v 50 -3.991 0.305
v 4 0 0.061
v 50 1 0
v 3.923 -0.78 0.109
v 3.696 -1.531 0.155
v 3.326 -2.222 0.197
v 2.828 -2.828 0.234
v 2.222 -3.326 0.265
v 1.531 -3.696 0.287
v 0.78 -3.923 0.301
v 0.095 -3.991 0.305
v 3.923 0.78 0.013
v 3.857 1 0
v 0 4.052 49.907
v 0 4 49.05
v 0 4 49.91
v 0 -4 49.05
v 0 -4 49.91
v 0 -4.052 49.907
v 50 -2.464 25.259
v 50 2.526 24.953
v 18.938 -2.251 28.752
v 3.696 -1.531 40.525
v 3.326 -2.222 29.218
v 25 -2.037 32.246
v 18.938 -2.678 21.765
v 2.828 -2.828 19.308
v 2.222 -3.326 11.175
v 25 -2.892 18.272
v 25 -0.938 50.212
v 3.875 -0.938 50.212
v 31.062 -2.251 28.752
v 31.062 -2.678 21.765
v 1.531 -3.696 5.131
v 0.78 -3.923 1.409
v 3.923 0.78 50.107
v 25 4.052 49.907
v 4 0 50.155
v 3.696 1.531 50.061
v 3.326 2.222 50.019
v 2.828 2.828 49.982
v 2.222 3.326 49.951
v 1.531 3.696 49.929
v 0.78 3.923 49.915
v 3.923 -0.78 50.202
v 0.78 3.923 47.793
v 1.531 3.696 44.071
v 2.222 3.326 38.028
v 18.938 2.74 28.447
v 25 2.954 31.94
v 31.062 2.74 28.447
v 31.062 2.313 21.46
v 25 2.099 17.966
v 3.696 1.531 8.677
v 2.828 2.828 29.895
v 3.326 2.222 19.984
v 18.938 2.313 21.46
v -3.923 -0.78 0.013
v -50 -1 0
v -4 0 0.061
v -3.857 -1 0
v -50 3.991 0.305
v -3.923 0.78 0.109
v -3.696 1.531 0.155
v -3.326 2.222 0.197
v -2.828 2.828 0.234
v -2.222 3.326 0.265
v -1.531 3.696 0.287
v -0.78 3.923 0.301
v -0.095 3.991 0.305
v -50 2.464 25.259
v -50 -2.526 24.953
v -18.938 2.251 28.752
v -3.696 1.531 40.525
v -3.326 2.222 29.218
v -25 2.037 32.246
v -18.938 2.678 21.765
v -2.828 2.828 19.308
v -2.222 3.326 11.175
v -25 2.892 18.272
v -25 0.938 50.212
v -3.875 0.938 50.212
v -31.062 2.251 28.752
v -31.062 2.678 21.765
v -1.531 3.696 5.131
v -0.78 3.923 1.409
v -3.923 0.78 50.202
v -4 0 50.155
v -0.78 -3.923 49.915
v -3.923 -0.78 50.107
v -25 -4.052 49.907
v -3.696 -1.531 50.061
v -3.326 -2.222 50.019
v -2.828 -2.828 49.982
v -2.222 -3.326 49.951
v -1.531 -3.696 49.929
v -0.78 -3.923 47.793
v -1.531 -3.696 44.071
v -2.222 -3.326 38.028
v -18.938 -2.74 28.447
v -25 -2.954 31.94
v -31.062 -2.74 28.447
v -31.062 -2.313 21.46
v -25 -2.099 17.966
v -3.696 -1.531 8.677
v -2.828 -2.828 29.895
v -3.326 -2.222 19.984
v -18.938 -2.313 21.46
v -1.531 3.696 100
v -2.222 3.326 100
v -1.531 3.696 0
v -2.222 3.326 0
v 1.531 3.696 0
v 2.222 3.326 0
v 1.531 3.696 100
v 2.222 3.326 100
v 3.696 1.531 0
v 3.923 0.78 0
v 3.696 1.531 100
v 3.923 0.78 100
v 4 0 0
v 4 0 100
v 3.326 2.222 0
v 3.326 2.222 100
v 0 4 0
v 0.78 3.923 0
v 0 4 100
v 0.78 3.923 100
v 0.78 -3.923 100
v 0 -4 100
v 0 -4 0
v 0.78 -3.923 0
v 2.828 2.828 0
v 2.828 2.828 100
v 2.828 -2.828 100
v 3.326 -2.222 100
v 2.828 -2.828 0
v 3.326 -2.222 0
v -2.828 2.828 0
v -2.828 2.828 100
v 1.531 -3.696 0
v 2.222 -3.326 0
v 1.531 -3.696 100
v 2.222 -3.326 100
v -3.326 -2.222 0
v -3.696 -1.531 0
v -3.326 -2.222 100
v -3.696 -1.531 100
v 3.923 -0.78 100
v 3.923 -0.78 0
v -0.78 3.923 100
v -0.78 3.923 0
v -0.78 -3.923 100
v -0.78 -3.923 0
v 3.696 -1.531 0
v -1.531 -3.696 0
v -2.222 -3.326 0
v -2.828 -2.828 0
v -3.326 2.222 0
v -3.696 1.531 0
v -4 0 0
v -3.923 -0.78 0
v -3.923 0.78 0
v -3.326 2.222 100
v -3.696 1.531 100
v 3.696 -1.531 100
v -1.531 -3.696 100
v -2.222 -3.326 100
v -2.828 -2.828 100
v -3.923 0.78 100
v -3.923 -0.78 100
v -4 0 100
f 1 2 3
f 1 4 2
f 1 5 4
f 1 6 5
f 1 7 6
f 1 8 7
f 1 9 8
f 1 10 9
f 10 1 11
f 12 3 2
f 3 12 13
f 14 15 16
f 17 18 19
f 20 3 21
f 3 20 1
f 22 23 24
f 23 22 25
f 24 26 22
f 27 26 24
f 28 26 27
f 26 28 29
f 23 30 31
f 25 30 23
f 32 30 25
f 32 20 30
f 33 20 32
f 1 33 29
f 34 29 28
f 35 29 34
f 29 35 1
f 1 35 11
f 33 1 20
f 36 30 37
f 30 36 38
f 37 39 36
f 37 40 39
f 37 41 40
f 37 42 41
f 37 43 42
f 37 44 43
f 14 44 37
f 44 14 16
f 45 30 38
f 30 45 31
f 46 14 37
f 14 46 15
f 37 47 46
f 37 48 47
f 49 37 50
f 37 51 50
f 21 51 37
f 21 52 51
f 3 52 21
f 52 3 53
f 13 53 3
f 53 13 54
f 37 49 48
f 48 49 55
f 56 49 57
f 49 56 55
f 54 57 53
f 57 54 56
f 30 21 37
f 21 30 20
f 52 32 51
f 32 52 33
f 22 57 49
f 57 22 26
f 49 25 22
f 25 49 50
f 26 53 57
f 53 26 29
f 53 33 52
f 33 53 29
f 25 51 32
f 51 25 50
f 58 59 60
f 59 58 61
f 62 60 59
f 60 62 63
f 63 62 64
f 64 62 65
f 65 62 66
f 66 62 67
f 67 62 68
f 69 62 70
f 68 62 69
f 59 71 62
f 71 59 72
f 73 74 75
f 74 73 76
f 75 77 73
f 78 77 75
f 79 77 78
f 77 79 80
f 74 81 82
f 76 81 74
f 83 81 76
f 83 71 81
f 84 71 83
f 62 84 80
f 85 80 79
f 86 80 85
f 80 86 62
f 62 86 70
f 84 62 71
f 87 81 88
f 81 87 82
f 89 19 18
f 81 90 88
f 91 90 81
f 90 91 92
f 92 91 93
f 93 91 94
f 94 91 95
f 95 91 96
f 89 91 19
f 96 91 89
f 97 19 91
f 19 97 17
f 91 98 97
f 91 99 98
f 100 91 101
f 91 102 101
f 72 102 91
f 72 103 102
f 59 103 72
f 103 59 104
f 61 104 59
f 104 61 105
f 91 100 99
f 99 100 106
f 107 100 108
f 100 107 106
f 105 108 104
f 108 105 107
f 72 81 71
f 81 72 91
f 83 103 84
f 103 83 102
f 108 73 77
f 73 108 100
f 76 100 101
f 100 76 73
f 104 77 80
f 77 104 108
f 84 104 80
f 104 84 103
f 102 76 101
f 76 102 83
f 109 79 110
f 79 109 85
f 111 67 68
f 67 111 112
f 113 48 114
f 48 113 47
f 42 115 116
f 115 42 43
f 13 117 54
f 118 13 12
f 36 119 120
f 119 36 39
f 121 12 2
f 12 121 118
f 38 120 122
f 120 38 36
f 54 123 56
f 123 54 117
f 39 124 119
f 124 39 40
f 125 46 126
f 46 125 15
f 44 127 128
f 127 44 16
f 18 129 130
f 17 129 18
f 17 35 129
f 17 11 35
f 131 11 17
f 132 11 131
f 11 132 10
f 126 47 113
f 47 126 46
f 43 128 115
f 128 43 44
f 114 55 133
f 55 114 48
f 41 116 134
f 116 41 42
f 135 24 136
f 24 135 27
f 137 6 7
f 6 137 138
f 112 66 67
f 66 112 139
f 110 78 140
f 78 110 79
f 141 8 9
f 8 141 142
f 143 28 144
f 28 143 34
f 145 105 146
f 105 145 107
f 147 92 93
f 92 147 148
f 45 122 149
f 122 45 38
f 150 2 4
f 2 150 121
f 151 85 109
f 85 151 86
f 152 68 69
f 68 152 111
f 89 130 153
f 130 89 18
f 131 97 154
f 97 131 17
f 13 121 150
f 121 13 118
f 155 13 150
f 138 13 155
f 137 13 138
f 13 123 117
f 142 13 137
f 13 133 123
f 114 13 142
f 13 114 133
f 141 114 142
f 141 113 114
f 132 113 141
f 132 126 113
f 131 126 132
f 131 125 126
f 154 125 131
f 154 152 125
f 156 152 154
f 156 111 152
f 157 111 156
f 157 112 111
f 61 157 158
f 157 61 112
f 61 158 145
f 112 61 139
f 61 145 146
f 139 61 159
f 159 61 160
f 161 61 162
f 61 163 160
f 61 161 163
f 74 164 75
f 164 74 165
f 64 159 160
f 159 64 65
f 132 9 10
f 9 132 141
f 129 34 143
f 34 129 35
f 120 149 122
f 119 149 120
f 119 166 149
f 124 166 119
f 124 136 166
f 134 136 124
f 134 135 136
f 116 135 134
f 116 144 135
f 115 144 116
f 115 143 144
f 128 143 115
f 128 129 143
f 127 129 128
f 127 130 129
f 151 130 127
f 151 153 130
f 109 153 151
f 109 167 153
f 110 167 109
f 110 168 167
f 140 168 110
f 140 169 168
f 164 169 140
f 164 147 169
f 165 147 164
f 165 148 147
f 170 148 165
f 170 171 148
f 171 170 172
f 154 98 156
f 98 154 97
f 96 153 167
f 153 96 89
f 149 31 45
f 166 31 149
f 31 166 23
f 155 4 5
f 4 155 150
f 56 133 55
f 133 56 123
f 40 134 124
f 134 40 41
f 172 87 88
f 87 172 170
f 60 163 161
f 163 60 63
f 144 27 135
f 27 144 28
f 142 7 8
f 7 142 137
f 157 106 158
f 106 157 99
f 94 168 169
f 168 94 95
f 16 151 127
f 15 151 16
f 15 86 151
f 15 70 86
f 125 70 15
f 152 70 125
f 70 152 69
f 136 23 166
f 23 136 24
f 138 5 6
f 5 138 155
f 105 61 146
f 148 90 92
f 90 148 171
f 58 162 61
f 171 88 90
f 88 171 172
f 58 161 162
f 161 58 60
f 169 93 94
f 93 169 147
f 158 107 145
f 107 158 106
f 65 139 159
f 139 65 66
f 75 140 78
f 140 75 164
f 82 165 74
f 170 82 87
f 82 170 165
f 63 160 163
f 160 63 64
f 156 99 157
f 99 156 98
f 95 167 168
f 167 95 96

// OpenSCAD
// 2024-09-08 adam mead
//
// Paint Stirrer, 3d printable
//

// Variables

cShaftDia = 8; // Shaft diameter
cShaftLen = 100; // Shaft length
cBladeDia = 50; // Blade diameter
cBladeThick = 5; // Blade thickness
cBladeLen = 50; // Blade length
cBladeHoleDia = 14; // Blade hole diameter
cRefine = 32; // Refinement level
cBladeOffset = 1; //to adjust for the blade position after rotation
cSweepAngle = -3.5; // Sweep angle for the blade
cBladePoints = [
    [0, 0],
    [cBladeLen, 0],
    [cBladeLen, cBladeDia / 2],
    [cBladeLen /2, cBladeDia],
    [0, cBladeDia],
    [0, 0]
];
// Functions

module shaft() {
    cylinder(d = cShaftDia, h = cShaftLen, $fn=cRefine);
}

module blade() {
    rotate([90, 0, 0]) {
        difference() {
            linear_extrude(height = cBladeThick) {
                polygon(points = cBladePoints);
            }
            translate([cBladeLen / 2, cBladeDia / 2, -1]) {
                rotate([0, 0, 90]) {
                    cylinder(d = cBladeHoleDia, h = cBladeThick + 2, $fn=6);
                }
            }
        }
    }
}

shaft();
translate([0, cBladeOffset, 0]) {
    rotate([cSweepAngle, 0, 0]) {
        blade();
    }
}
translate([0, -cBladeOffset, 0]) {
    rotate([0, 0, 180]) {
        rotate([cSweepAngle, 0, 0]) {
            blade();
        }
    }
}
